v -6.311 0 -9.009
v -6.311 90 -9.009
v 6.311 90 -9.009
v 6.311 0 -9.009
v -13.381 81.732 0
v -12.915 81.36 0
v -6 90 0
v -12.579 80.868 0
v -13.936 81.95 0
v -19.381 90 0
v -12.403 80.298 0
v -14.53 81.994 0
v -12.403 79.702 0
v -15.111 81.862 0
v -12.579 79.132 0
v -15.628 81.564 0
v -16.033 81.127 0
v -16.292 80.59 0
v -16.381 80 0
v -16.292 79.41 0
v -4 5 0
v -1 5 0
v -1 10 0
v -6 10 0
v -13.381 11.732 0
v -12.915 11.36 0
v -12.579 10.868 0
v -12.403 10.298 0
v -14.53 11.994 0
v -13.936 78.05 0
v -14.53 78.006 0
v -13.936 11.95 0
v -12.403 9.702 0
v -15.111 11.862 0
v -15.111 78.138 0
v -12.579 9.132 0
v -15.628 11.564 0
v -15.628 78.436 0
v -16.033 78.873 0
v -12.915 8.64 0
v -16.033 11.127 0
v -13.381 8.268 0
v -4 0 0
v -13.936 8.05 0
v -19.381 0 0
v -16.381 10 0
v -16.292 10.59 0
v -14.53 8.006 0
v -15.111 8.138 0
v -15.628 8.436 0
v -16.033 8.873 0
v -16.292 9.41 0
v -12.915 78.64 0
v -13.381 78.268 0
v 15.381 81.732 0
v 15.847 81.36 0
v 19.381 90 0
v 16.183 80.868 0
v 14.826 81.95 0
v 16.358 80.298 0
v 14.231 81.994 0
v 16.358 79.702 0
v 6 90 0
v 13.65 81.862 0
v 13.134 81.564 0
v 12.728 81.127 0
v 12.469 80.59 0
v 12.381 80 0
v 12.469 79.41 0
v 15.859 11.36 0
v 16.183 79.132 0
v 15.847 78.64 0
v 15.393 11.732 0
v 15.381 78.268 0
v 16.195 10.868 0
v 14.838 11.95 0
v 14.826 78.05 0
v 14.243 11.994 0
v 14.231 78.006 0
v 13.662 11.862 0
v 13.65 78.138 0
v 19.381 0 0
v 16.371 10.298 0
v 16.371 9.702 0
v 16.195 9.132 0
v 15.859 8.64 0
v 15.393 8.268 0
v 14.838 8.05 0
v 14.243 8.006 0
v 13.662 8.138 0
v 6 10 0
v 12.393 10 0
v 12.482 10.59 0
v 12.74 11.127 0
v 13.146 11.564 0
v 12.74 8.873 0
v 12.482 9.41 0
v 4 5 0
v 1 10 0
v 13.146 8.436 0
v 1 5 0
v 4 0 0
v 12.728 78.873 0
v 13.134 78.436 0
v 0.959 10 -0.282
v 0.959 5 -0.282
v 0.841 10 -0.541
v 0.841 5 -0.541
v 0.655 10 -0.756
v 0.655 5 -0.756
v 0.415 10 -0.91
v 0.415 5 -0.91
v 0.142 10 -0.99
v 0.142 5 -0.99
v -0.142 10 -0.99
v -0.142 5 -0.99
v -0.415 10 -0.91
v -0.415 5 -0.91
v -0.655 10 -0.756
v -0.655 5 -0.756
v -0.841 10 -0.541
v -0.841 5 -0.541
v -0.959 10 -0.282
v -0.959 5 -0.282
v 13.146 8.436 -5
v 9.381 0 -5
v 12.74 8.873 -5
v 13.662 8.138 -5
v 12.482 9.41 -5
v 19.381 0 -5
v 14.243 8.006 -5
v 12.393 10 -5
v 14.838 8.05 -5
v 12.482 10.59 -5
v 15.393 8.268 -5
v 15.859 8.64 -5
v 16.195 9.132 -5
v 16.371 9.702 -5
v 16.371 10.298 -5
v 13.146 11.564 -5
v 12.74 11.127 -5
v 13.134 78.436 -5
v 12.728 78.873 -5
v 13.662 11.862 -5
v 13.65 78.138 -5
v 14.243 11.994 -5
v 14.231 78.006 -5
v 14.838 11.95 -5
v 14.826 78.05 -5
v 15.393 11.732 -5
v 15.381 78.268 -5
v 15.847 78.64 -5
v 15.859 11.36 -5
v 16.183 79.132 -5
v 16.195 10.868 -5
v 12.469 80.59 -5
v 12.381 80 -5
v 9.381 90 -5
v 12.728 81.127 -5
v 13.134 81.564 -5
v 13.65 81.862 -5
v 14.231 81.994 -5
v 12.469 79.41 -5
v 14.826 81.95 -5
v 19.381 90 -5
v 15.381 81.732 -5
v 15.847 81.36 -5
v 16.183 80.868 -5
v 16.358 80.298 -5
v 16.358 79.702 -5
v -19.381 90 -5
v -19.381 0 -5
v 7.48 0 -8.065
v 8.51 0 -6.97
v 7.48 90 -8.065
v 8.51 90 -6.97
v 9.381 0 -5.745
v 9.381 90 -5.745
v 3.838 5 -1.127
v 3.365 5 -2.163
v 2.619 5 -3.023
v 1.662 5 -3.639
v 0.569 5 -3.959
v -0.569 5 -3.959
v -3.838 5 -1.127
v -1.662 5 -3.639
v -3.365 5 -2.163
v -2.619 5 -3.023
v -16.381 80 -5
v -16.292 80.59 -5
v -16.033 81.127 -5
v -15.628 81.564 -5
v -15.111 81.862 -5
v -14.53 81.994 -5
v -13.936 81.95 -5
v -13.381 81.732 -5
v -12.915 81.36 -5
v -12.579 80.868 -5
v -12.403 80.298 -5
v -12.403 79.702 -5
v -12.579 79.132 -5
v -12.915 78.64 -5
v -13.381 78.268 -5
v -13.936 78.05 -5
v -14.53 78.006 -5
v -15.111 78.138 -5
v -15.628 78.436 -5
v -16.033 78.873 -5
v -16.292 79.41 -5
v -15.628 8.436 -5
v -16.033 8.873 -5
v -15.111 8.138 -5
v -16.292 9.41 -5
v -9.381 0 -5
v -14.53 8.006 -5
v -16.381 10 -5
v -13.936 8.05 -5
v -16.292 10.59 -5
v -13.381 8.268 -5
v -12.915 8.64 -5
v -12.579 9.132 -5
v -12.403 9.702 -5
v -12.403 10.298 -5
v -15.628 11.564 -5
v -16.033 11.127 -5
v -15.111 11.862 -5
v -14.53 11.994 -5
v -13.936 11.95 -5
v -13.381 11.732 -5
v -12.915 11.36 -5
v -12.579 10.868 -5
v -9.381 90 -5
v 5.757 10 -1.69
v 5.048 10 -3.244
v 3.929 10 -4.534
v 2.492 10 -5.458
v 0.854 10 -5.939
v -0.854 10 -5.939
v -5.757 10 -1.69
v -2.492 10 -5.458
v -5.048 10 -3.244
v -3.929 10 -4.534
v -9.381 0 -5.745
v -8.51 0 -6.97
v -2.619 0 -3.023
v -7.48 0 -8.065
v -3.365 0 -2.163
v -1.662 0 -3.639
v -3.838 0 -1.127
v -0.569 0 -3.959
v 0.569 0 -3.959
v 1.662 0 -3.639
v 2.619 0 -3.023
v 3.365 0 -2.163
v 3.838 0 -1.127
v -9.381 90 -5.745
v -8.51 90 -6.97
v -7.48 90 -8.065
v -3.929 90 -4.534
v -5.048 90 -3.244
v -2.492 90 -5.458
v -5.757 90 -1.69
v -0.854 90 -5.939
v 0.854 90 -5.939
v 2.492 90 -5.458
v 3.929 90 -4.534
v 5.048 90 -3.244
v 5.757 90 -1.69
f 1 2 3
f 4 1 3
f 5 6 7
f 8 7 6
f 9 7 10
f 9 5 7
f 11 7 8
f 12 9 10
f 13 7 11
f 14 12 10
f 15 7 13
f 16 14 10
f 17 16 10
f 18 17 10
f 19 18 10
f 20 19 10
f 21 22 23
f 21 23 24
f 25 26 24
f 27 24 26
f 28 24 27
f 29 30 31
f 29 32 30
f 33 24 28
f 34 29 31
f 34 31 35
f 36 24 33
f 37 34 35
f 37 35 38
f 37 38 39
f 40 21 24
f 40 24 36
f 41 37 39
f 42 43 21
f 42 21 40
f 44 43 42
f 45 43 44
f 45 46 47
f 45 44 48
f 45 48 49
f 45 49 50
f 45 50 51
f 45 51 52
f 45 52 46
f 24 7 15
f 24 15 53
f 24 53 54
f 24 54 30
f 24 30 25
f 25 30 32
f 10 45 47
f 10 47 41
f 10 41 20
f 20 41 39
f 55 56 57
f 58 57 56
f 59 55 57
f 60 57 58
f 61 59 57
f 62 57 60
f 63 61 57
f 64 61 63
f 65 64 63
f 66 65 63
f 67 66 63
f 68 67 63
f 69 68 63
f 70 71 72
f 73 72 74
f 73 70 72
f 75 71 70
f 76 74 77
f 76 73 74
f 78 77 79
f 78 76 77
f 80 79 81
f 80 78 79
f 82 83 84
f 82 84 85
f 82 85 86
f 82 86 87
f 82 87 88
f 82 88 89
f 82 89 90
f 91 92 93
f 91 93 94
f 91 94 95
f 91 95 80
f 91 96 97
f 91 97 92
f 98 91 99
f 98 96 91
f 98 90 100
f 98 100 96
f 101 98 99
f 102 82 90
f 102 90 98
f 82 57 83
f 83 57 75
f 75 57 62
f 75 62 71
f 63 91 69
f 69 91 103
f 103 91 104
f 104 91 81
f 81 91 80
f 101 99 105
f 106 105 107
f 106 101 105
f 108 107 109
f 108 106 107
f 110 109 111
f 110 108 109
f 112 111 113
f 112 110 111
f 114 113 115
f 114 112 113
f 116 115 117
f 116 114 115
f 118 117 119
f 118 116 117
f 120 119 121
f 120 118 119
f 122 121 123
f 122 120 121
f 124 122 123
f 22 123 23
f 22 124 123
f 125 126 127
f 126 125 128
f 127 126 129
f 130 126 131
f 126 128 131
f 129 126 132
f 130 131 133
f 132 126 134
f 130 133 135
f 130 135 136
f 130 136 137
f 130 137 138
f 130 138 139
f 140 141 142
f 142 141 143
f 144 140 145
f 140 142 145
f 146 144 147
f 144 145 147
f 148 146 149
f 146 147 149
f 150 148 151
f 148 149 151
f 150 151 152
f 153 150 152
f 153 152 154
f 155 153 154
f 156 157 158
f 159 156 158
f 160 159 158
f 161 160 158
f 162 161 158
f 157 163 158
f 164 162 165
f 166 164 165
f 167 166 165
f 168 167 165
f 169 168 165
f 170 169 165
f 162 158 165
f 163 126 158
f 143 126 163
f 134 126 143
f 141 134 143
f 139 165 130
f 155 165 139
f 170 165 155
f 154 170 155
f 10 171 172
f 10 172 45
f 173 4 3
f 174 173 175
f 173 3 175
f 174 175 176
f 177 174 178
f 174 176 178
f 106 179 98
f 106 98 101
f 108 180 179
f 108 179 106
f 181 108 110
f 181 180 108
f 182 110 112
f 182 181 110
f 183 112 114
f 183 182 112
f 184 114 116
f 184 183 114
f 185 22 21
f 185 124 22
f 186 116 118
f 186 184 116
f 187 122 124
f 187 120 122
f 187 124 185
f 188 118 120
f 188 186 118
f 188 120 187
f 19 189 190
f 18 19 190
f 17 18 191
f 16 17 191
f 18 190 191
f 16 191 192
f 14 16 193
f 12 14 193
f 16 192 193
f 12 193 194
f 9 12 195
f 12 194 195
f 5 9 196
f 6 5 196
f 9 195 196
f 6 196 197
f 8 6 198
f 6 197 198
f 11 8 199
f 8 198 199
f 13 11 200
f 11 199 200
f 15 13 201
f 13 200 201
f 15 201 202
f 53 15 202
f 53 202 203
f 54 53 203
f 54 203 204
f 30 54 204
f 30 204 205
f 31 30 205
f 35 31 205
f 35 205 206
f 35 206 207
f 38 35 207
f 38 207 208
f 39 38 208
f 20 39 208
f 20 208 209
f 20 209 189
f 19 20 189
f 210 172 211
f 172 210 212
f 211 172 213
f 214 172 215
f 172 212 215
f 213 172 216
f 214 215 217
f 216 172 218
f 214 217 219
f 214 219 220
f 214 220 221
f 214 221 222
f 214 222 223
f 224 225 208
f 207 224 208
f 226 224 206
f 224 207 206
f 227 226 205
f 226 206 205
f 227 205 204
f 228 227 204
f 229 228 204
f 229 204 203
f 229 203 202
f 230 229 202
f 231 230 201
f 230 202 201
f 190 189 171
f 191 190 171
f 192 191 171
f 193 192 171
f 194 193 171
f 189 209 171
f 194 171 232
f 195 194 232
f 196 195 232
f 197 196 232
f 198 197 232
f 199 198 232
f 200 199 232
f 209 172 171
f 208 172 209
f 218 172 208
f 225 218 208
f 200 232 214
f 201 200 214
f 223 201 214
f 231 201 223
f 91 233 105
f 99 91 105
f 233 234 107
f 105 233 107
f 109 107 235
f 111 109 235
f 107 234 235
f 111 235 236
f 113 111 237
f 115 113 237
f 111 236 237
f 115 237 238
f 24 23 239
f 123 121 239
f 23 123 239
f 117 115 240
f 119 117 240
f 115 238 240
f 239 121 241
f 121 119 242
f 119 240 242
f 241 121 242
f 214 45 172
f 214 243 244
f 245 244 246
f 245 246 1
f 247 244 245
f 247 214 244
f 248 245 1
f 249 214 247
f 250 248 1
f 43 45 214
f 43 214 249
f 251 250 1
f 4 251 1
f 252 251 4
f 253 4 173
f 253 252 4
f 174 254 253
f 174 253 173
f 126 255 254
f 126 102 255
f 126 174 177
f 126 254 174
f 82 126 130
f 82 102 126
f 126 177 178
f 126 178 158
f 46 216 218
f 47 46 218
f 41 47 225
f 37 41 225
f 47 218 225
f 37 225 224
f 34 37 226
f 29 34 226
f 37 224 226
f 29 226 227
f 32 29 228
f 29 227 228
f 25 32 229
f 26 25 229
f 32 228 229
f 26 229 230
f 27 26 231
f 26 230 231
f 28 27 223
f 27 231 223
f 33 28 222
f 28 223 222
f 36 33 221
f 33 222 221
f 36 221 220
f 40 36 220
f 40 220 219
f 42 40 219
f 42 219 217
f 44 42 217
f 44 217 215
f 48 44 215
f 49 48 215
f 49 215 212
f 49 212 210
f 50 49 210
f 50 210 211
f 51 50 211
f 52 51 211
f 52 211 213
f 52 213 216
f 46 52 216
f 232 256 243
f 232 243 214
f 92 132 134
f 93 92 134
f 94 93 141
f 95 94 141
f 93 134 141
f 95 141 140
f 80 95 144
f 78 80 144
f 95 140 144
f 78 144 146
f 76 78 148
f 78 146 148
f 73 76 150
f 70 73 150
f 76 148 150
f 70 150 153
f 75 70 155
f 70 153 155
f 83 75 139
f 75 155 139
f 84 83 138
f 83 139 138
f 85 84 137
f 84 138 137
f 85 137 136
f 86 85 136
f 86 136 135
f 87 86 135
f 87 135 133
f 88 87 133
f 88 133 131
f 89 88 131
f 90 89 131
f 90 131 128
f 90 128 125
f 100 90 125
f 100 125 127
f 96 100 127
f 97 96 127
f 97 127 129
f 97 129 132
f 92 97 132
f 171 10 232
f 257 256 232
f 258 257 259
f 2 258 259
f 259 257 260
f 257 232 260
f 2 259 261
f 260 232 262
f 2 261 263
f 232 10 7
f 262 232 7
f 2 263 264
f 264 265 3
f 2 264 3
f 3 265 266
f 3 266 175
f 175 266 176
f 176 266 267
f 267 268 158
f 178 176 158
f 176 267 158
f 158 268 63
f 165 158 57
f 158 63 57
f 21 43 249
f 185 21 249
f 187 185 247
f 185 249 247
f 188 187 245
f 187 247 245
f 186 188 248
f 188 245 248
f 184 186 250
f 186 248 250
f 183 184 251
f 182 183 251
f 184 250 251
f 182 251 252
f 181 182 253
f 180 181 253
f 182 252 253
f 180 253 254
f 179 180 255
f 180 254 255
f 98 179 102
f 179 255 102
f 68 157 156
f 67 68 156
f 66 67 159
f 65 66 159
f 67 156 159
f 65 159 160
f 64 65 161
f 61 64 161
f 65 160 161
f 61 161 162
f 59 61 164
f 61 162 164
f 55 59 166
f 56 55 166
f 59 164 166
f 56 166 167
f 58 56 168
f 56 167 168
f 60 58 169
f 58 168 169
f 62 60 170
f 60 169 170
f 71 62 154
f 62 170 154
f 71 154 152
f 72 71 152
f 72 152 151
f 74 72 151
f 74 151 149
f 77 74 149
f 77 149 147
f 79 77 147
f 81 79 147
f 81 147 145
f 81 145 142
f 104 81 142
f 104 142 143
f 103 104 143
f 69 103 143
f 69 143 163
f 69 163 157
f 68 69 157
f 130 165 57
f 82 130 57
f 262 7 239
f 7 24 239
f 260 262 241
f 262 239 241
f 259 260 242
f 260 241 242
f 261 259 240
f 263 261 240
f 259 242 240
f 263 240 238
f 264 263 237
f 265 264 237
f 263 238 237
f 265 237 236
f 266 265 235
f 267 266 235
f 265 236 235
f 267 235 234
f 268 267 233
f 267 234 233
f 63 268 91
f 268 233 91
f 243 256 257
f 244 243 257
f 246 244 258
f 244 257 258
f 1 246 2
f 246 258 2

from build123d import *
from build123d.topology import SkipClean

# Parameters (mm, degrees)
ROTATION1_ANGLE                      = 180
SCHNITT_LINEAR_AUSTRAGEN2_DEPTH      = 92.33454987
SCHNITT_LINEAR_AUSTRAGEN2_DEPTH_BACK = 90
SCHNITT_LINEAR_AUSTRAGEN3_DEPTH      = 92.33454987
SCHNITT_LINEAR_AUSTRAGEN3_DEPTH_BACK = 90
SKIZZE8_W                            = 10
SKIZZE8_H                            = 5
AUFSATZ_LINEAR_AUSTRAGEN2_DEPTH      = 90
SKIZZE9_W                            = 10
SKIZZE9_H                            = 5
AUFSATZ_LINEAR_AUSTRAGEN3_DEPTH      = 90
SKIZZE12_R                           = 1
SCHNITT_LINEAR_AUSTRAGEN5_DEPTH      = 20
SKIZZE13_W                           = 38.761249726
SKIZZE13_H                           = 19.724182296
SCHNITT_LINEAR_AUSTRAGEN7_DEPTH      = 90
SKIZZE14_R                           = 4
SCHNITT_LINEAR_AUSTRAGEN8_DEPTH      = 5
SKIZZE15_R                           = 2
SCHNITT_LINEAR_AUSTRAGEN9_DEPTH      = 93.258379674
SKIZZE17_W                           = 21.457385309
SKIZZE17_H                           = 2
SCHNITT_LINEAR_AUSTRAGEN16_DEPTH     = 93.717898057


with BuildPart() as part:
    # Skizze3 → Rotation1 (revolve)
    with BuildSketch(Plane.XY):
        Polygon((0, 0), (-11, 0), (-11, 90), (-6, 90), (-6, 10), (0, 10), align=None)
    revolve(axis=Axis((0, 0, 0), (0, 1, 0)), revolution_arc=ROTATION1_ANGLE)

    # Skizze6 → Schnitt-Linear austragen2 (cut, two sides: drawn at the far end of the back side and taken through both)
    with BuildSketch(Plane(origin=(0, 90, 0), x_dir=(1, 0, 0), z_dir=(0, 1, 0)).offset(-SCHNITT_LINEAR_AUSTRAGEN2_DEPTH_BACK)):
        Polygon((-9.380624863, -62.0642209), (-9.380624863, -5.744900102), (-9.380624863, 0), (-9.380624863, 56.319320799), (-122.01926646, 56.319320799), (-122.01926646, -62.0642209), align=None)
    extrude(amount=SCHNITT_LINEAR_AUSTRAGEN2_DEPTH + SCHNITT_LINEAR_AUSTRAGEN2_DEPTH_BACK, mode=Mode.SUBTRACT)

    # Skizze7 → Schnitt-Linear austragen3 (cut, two sides: drawn at the far end of the back side and taken through both)
    with BuildSketch(Plane.XZ.offset(-SCHNITT_LINEAR_AUSTRAGEN3_DEPTH_BACK)):
        Polygon((9.380624863, 59.241313346), (9.380624863, 5.744900102), (9.380624863, 0), (9.380624863, -53.496413245), (116.373451353, -53.496413245), (116.373451353, 59.241313346), align=None)
    extrude(amount=SCHNITT_LINEAR_AUSTRAGEN3_DEPTH + SCHNITT_LINEAR_AUSTRAGEN3_DEPTH_BACK, mode=Mode.SUBTRACT)

    # Skizze8 → Aufsatz-Linear austragen2 (add)
    with BuildSketch(Plane(origin=(0, 90, 0), x_dir=(1, 0, 0), z_dir=(0, 1, 0))):
        with Locations((-14.380624863, -2.5)):
            Rectangle(SKIZZE8_W, SKIZZE8_H)
    extrude(amount=-AUFSATZ_LINEAR_AUSTRAGEN2_DEPTH)

    # Skizze9 → Aufsatz-Linear austragen3 (add)
    with BuildSketch(Plane(origin=(0, 90, 0), x_dir=(1, 0, 0), z_dir=(0, 1, 0))):
        with Locations((14.380624863, -2.5)):
            Rectangle(SKIZZE9_W, SKIZZE9_H)
    extrude(amount=-AUFSATZ_LINEAR_AUSTRAGEN3_DEPTH)

    # Skizze12 → Schnitt-Linear austragen5 (cut)
    with BuildSketch(Plane(origin=(0, 0, 0), x_dir=(-1, 0, 0), z_dir=(0, -1, 0))):
        Circle(SKIZZE12_R)
    extrude(amount=-SCHNITT_LINEAR_AUSTRAGEN5_DEPTH, mode=Mode.SUBTRACT)

    # Spiegeln2: part across face


with BuildPart() as part_1:
    with SkipClean():  # the faces are left unmerged after this step: merging them gives an invalid solid
        add(part.part)
        add(part.part.mirror(Plane(origin=(12.323947404, 43.405429497, 0), x_dir=(1, 0, 0), z_dir=(0, 0, -1))))

    # Skizze13 → Schnitt-Linear austragen7 (cut)
    with BuildSketch(Plane(origin=(0, 0, 0), x_dir=(-1, 0, 0), z_dir=(0, -1, 0))):
        with Locations((0, -9.862091148)):
            Rectangle(SKIZZE13_W, SKIZZE13_H)
    extrude(amount=-SCHNITT_LINEAR_AUSTRAGEN7_DEPTH, mode=Mode.SUBTRACT)

    # Skizze14 → Schnitt-Linear austragen8 (cut)
    with BuildSketch(Plane(origin=(0, 0, 0), x_dir=(-1, 0, 0), z_dir=(0, -1, 0))):
        Circle(SKIZZE14_R)
    extrude(amount=-SCHNITT_LINEAR_AUSTRAGEN8_DEPTH, mode=Mode.SUBTRACT)

    # Skizze15 → Schnitt-Linear austragen9 (cut, through all)
    with BuildSketch(Plane(origin=(0, 0, -5), x_dir=(-1, 0, 0), z_dir=(0, 0, -1))):
        with Locations((-14.380624863, 80)):
            Circle(SKIZZE15_R)
        with Locations((-14.392959085, 10)):
            Circle(SKIZZE15_R)
        with Locations((14.380624863, 10)):
            Circle(SKIZZE15_R)
        with Locations((14.380624863, 80)):
            Circle(SKIZZE15_R)
    extrude(amount=-SCHNITT_LINEAR_AUSTRAGEN9_DEPTH, mode=Mode.SUBTRACT)

    # Skizze17 → Schnitt-Linear austragen16 (cut, through all)
    with BuildSketch(Plane(origin=(0, 90, 0), x_dir=(1, 0, 0), z_dir=(0, 1, 0))):
        with Locations((0.273845189, 10.009257492)):
            Rectangle(SKIZZE17_W, SKIZZE17_H)
    extrude(amount=-SCHNITT_LINEAR_AUSTRAGEN16_DEPTH, mode=Mode.SUBTRACT)


solid = part_1.part
